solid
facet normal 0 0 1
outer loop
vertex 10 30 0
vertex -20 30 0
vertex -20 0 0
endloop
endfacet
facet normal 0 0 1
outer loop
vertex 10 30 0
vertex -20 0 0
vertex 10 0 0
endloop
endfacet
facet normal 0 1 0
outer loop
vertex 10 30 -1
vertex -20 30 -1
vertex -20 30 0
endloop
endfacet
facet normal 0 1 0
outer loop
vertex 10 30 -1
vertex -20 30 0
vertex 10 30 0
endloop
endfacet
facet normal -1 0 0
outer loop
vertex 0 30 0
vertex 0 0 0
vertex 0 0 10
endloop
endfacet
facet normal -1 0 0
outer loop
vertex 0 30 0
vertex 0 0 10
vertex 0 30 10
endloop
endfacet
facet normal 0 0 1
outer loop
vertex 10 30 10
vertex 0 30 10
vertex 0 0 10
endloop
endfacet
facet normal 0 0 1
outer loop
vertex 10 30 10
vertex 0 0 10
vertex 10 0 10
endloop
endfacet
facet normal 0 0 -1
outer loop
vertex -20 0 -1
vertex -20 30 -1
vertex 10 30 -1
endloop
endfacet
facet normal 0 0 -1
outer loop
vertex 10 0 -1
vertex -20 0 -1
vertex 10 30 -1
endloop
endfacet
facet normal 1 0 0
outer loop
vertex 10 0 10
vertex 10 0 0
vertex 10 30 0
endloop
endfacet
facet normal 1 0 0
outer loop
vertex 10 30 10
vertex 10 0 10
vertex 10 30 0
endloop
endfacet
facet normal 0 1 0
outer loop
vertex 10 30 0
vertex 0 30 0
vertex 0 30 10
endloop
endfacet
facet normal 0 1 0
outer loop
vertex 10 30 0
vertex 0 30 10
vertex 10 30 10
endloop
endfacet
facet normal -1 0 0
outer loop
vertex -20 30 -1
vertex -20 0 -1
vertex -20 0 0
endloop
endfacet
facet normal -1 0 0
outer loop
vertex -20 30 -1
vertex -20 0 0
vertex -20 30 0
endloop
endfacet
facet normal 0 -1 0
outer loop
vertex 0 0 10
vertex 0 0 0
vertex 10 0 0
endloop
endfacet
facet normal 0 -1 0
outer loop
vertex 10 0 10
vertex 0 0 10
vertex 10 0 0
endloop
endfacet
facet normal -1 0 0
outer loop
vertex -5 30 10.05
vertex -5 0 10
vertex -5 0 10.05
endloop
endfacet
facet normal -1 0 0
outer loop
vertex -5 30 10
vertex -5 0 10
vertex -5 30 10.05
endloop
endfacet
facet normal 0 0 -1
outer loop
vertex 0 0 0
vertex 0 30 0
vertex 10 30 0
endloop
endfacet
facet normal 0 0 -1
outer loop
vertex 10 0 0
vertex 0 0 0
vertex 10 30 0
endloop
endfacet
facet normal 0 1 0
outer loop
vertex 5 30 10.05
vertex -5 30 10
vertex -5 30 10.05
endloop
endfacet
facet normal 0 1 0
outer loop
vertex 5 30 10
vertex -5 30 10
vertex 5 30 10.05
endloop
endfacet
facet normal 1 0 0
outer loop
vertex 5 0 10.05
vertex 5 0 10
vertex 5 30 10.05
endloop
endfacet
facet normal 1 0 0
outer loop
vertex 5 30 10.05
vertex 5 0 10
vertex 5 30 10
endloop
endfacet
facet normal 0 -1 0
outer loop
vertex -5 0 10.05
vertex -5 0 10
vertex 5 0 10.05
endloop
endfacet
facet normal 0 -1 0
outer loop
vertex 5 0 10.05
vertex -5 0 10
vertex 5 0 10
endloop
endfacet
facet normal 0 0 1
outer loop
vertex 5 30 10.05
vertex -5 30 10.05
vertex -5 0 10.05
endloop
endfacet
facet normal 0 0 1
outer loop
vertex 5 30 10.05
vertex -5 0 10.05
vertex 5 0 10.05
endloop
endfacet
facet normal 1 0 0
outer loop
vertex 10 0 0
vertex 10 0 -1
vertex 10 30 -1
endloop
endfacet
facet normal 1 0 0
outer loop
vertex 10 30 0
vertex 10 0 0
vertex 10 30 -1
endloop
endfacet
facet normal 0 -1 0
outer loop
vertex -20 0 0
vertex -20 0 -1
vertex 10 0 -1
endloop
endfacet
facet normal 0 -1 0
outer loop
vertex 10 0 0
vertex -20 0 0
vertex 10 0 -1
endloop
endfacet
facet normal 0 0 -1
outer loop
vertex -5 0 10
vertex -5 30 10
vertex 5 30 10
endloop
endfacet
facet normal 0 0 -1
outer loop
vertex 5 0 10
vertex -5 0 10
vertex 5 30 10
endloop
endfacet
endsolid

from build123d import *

# Parameters (mm, degrees)
BOX_W        = 10
BOX_H        = 30
BOX_DEPTH    = 0.05
BOX001_W     = 10
BOX001_H     = 30
BOX001_DEPTH = 10
BOX002_W     = 30
BOX002_H     = 30
BOX002_DEPTH = 1


with BuildPart() as cubo:
    # Box → Box (new body)
    with BuildSketch(Plane(origin=(-5, 0, 10), x_dir=(1, 0, 0), z_dir=(0, 0, 1))):
        with Locations((5, 15)):
            Rectangle(BOX_W, BOX_H)
    extrude(amount=BOX_DEPTH)


with BuildPart() as cubo001:
    # Box001 → Box001 (new body)
    with BuildSketch(Plane.XY):
        with Locations((5, 15)):
            Rectangle(BOX001_W, BOX001_H)
    extrude(amount=BOX001_DEPTH)


with BuildPart() as cubo002:
    # Box002 → Box002 (new body)
    with BuildSketch(Plane(origin=(-20, 0, -1), x_dir=(1, 0, 0), z_dir=(0, 0, 1))):
        with Locations((15, 15)):
            Rectangle(BOX002_W, BOX002_H)
    extrude(amount=BOX002_DEPTH)


solid = Compound([cubo.part, cubo001.part, cubo002.part])
